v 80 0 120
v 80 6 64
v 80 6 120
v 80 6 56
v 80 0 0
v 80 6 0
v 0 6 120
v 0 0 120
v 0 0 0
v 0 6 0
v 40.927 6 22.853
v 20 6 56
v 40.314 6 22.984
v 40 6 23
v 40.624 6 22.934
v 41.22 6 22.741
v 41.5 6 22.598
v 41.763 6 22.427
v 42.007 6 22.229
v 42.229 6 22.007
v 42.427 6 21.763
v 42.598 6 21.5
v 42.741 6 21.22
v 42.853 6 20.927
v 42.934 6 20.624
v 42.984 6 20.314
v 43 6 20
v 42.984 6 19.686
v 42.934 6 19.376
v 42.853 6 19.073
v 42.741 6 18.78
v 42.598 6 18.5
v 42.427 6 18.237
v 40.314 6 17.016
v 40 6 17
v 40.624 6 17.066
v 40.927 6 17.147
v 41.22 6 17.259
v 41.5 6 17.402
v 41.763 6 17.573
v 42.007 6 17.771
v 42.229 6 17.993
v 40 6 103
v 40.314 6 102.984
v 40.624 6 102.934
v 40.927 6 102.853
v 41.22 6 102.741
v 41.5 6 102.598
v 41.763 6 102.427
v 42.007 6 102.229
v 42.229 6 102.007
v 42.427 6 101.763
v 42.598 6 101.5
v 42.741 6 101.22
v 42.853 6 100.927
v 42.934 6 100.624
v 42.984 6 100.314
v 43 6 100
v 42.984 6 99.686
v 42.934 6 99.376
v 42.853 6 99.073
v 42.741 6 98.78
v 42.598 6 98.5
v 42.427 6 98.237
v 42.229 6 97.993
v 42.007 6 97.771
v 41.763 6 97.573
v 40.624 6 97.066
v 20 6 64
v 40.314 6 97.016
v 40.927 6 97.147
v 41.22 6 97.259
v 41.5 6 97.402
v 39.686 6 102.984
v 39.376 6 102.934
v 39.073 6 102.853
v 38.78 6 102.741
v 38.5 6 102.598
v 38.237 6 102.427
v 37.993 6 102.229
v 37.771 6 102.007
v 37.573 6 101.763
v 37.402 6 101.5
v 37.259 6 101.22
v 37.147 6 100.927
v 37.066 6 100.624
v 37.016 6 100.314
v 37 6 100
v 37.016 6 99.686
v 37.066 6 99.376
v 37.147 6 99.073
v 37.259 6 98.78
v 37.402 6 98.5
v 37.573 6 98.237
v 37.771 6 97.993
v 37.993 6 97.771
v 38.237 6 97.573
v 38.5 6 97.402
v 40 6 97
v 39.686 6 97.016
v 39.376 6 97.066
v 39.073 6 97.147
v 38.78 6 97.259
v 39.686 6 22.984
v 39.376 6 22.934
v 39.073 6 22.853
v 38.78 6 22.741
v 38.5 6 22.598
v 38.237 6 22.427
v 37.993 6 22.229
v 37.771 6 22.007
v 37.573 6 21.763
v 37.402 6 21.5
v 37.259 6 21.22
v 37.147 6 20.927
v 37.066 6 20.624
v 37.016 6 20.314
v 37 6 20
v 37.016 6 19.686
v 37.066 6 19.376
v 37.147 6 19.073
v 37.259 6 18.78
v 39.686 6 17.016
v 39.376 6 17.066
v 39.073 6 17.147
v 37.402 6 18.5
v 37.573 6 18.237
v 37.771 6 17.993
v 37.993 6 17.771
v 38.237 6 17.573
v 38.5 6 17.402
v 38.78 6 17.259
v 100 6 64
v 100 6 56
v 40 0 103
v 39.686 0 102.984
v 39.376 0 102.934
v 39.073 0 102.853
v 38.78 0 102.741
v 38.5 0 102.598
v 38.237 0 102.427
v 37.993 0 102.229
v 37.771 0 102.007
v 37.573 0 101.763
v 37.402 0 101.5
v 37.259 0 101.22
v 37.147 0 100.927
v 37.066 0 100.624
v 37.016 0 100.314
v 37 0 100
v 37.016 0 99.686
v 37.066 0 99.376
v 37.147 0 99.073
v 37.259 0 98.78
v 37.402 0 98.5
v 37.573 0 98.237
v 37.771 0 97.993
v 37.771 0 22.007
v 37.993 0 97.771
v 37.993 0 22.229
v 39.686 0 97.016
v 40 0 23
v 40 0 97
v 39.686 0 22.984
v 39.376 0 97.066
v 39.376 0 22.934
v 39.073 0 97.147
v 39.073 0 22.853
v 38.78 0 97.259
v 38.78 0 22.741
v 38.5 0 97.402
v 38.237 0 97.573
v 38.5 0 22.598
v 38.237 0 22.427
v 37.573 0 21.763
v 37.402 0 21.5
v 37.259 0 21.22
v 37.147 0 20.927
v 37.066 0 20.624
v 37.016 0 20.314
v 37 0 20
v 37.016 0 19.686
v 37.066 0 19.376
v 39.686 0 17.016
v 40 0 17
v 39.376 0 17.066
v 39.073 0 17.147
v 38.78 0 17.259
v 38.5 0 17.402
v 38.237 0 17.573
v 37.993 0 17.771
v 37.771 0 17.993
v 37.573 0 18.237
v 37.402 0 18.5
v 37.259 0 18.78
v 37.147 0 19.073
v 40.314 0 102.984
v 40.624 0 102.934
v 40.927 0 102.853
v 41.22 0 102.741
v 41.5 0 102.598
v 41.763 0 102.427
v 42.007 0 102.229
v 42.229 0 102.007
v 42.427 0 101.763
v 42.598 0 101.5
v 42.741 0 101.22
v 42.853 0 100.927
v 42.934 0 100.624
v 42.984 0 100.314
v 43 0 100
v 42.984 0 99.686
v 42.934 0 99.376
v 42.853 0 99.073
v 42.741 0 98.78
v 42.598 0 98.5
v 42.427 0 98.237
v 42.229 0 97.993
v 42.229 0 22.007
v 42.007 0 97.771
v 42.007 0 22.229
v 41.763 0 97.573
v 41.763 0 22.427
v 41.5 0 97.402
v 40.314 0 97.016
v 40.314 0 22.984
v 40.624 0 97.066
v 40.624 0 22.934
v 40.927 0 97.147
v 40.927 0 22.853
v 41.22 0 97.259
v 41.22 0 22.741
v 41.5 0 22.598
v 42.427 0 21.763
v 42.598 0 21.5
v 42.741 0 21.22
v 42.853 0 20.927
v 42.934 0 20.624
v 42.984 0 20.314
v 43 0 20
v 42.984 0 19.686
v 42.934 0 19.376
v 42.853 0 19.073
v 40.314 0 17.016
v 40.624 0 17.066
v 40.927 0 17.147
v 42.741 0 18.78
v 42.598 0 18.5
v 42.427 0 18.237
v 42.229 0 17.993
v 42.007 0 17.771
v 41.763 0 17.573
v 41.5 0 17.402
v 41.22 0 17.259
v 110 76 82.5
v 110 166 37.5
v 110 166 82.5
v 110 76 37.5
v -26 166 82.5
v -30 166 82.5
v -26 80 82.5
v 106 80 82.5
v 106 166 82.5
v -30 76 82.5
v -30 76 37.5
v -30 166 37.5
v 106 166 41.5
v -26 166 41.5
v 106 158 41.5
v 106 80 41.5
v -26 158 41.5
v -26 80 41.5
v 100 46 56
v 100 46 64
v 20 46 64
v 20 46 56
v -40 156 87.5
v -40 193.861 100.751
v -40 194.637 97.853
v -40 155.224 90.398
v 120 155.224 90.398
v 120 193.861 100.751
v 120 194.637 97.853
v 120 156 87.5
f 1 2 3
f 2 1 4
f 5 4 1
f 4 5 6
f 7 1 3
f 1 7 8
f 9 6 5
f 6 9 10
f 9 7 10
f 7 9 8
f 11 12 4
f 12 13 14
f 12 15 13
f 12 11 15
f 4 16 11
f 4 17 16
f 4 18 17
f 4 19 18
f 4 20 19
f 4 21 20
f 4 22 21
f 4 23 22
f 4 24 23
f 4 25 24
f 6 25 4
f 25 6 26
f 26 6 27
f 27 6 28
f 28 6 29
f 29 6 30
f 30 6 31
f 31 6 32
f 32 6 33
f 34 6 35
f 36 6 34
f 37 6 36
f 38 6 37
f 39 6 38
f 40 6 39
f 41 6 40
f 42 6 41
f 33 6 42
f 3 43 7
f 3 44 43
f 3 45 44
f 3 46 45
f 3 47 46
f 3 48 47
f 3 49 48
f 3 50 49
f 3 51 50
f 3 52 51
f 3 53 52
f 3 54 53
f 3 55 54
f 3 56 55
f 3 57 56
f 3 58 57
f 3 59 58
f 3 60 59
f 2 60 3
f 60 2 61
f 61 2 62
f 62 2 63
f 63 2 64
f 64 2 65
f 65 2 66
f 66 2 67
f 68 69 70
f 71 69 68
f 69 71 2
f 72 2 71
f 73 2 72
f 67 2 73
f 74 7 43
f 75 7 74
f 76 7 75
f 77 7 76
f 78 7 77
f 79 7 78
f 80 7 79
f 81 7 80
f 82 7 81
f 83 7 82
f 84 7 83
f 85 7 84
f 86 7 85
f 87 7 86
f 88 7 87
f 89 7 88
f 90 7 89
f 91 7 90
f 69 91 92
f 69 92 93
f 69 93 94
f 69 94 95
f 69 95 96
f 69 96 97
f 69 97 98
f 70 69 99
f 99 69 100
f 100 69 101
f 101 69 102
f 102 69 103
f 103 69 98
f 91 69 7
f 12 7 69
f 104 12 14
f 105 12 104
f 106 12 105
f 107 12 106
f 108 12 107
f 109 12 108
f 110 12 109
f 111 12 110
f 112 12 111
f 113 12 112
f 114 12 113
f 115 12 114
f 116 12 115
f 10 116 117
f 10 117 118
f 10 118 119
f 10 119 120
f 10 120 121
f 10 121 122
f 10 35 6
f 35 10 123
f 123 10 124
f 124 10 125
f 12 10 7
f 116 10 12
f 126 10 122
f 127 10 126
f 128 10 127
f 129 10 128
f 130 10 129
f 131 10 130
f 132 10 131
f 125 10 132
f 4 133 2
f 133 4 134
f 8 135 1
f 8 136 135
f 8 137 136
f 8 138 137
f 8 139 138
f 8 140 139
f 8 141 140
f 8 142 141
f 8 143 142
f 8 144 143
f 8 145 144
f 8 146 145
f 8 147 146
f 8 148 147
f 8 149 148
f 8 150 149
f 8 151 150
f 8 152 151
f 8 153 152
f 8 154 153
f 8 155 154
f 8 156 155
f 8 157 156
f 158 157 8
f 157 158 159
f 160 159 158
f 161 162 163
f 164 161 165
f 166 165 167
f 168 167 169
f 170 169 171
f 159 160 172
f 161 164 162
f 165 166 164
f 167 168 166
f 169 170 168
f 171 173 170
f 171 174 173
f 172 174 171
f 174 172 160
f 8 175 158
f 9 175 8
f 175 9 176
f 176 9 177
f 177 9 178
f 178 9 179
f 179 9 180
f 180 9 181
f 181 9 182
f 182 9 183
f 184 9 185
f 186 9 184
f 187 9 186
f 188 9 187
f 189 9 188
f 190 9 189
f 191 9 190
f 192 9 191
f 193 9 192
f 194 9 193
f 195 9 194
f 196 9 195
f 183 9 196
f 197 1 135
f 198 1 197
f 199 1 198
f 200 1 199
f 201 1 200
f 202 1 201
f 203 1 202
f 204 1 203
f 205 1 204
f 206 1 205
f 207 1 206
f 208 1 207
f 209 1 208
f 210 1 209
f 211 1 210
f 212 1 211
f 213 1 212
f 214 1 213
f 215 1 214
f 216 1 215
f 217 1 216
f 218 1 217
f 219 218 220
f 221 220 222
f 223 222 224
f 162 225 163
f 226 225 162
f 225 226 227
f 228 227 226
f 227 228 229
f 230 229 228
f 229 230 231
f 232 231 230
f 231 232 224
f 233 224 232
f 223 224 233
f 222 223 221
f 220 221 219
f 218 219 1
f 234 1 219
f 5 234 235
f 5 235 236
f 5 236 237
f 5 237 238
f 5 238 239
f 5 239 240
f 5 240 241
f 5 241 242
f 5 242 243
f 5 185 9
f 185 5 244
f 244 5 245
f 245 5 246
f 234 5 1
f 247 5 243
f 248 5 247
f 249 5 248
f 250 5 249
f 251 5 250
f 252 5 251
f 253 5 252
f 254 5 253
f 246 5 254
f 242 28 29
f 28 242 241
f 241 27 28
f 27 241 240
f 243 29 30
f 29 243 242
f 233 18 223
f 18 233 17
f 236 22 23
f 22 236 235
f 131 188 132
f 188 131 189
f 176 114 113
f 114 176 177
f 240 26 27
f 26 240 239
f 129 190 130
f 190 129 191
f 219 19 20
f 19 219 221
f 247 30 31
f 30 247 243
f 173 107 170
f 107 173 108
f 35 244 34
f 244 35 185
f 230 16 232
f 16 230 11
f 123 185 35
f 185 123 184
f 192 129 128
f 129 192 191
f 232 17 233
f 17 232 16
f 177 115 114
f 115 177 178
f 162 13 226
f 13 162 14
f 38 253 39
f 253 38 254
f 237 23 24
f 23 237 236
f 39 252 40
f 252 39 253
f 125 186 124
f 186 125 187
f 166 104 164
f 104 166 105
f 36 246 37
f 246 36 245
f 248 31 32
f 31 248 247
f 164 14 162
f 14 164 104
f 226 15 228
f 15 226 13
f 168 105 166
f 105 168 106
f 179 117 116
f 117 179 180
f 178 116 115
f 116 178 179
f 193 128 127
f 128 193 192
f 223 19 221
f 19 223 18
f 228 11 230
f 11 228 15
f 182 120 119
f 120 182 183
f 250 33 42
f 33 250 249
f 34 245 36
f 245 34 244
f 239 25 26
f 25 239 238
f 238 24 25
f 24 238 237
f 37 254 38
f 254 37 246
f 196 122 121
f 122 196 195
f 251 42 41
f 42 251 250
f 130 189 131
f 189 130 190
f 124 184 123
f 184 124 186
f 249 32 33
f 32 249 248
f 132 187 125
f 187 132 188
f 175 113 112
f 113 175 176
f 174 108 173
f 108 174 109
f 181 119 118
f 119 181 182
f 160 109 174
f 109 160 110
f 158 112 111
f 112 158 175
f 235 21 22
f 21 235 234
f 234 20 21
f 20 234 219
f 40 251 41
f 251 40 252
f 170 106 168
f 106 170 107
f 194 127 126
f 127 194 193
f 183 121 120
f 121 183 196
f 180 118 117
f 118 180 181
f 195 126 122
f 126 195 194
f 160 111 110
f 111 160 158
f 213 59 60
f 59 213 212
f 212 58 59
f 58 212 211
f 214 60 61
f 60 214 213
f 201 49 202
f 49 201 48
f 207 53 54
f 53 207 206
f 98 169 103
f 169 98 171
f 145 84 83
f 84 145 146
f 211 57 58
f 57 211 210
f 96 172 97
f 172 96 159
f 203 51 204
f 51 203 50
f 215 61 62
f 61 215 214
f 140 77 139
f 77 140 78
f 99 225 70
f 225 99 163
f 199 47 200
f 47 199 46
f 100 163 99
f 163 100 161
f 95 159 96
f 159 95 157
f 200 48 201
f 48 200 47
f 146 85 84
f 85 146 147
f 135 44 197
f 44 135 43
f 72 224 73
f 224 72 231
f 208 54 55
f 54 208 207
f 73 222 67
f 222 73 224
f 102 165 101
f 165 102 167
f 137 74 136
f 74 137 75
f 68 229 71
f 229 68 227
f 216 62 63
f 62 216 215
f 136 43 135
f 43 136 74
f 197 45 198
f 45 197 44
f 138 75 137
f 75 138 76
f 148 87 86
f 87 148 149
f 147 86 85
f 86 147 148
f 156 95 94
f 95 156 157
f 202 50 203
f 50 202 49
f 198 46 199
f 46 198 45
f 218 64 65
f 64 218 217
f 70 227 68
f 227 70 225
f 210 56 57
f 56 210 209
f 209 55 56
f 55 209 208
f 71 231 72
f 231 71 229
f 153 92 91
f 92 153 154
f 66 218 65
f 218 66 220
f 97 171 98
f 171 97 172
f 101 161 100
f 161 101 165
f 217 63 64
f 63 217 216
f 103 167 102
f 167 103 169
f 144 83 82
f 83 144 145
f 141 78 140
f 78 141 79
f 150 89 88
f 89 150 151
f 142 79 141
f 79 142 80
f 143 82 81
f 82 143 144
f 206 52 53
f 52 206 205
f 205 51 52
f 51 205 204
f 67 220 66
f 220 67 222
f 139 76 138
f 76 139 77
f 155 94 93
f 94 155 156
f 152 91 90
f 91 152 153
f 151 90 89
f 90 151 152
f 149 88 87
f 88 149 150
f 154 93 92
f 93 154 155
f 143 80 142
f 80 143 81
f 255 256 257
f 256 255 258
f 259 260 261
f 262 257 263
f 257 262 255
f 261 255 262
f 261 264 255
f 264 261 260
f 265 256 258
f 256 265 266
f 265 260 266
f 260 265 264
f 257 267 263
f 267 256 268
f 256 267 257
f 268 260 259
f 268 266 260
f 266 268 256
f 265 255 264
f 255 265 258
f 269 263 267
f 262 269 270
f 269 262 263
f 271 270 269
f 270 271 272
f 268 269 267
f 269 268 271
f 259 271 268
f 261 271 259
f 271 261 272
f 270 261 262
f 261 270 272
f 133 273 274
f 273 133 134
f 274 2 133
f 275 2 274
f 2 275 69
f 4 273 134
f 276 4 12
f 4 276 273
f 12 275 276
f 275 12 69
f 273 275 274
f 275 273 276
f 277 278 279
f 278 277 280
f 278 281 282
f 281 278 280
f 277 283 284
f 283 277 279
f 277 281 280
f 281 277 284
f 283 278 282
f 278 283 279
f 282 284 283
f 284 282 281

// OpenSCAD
// ============================================================
// Reolink Argus 4 Pro Outdoor Mount + Rain Hood
// Designed for Garage48 / Estonia outdoor use
// Camera body approx: 128 x 87 x 80 mm
// Print in PETG or ASA for outdoor weather resistance
// ============================================================

/* [Camera Cradle] */
cradle_width = 140;          // mm - slightly wider than camera
cradle_depth = 90;           // mm
cradle_height = 45;          // mm - how high the cradle walls are
wall_thickness = 4;          // mm
cradle_lip = 8;              // mm - front lip to hold camera

/* [Mount Arm] */
arm_length = 80;             // mm - distance from wall to camera
arm_width = 40;              // mm
arm_thickness = 8;           // mm

/* [Wall Plate] */
wall_plate_width = 80;       // mm
wall_plate_height = 120;     // mm
wall_plate_thickness = 6;    // mm
mount_hole_diameter = 6;     // mm - for M6 screws or expansion bolts
hole_spacing_y = 80;         // mm

/* [Rain Hood] */
hood_overhang = 40;          // mm - how far the hood extends in front
hood_thickness = 3;          // mm
hood_angle = 15;             // degrees - slight downward slope for rain runoff

/* [Hidden] */
$fn = 60;

// ============================================================
// Modules
// ============================================================

module wall_plate() {
    difference() {
        // Main plate
        cube([wall_plate_width, wall_plate_thickness, wall_plate_height], center=false);
        
        // Mounting holes
        translate([wall_plate_width/2, -1, wall_plate_height/2 - hole_spacing_y/2])
            rotate([-90, 0, 0])
            cylinder(h=wall_plate_thickness+2, d=mount_hole_diameter);
            
        translate([wall_plate_width/2, -1, wall_plate_height/2 + hole_spacing_y/2])
            rotate([-90, 0, 0])
            cylinder(h=wall_plate_thickness+2, d=mount_hole_diameter);
    }
}

module arm() {
    // Simple rectangular arm from wall to cradle
    cube([arm_length, arm_width, arm_thickness], center=false);
}

module cradle() {
    difference() {
        // Outer cradle body
        cube([cradle_width, cradle_depth, cradle_height], center=false);
        
        // Inner cavity (camera sits here)
        translate([wall_thickness, wall_thickness, wall_thickness])
            cube([cradle_width - 2*wall_thickness, 
                  cradle_depth - wall_thickness - cradle_lip, 
                  cradle_height + 1], center=false);
        
        // Front opening (camera faces this way)
        translate([wall_thickness, cradle_depth - cradle_lip - 1, wall_thickness])
            cube([cradle_width - 2*wall_thickness, cradle_lip + 2, cradle_height], center=false);
    }
    
    // Front lip to retain camera
    translate([0, cradle_depth - cradle_lip, 0])
        cube([cradle_width, cradle_lip, wall_thickness], center=false);
}

module rain_hood() {
    // Simple angled rain hood above the camera
    hood_length = cradle_width + 20;
    hood_depth = hood_overhang;
    
    rotate([hood_angle, 0, 0])
        cube([hood_length, hood_depth, hood_thickness], center=false);
}

// ============================================================
// Assembly
// ============================================================

// Wall plate (mounted on wall)
wall_plate();

// Arm extending from wall
translate([ (wall_plate_width - arm_width)/2 , wall_plate_thickness, (wall_plate_height - arm_thickness)/2 ])
    arm();

// Cradle at the end of the arm
translate([ 
    (wall_plate_width - cradle_width)/2 , 
    wall_plate_thickness + arm_length - 10, 
    (wall_plate_height - cradle_height)/2 
])
    cradle();

// Rain hood above the cradle
translate([ 
    (wall_plate_width - cradle_width)/2 - 10, 
    wall_plate_thickness + arm_length + cradle_depth - 20, 
    (wall_plate_height + cradle_height)/2 + 5 
])
    rain_hood();
